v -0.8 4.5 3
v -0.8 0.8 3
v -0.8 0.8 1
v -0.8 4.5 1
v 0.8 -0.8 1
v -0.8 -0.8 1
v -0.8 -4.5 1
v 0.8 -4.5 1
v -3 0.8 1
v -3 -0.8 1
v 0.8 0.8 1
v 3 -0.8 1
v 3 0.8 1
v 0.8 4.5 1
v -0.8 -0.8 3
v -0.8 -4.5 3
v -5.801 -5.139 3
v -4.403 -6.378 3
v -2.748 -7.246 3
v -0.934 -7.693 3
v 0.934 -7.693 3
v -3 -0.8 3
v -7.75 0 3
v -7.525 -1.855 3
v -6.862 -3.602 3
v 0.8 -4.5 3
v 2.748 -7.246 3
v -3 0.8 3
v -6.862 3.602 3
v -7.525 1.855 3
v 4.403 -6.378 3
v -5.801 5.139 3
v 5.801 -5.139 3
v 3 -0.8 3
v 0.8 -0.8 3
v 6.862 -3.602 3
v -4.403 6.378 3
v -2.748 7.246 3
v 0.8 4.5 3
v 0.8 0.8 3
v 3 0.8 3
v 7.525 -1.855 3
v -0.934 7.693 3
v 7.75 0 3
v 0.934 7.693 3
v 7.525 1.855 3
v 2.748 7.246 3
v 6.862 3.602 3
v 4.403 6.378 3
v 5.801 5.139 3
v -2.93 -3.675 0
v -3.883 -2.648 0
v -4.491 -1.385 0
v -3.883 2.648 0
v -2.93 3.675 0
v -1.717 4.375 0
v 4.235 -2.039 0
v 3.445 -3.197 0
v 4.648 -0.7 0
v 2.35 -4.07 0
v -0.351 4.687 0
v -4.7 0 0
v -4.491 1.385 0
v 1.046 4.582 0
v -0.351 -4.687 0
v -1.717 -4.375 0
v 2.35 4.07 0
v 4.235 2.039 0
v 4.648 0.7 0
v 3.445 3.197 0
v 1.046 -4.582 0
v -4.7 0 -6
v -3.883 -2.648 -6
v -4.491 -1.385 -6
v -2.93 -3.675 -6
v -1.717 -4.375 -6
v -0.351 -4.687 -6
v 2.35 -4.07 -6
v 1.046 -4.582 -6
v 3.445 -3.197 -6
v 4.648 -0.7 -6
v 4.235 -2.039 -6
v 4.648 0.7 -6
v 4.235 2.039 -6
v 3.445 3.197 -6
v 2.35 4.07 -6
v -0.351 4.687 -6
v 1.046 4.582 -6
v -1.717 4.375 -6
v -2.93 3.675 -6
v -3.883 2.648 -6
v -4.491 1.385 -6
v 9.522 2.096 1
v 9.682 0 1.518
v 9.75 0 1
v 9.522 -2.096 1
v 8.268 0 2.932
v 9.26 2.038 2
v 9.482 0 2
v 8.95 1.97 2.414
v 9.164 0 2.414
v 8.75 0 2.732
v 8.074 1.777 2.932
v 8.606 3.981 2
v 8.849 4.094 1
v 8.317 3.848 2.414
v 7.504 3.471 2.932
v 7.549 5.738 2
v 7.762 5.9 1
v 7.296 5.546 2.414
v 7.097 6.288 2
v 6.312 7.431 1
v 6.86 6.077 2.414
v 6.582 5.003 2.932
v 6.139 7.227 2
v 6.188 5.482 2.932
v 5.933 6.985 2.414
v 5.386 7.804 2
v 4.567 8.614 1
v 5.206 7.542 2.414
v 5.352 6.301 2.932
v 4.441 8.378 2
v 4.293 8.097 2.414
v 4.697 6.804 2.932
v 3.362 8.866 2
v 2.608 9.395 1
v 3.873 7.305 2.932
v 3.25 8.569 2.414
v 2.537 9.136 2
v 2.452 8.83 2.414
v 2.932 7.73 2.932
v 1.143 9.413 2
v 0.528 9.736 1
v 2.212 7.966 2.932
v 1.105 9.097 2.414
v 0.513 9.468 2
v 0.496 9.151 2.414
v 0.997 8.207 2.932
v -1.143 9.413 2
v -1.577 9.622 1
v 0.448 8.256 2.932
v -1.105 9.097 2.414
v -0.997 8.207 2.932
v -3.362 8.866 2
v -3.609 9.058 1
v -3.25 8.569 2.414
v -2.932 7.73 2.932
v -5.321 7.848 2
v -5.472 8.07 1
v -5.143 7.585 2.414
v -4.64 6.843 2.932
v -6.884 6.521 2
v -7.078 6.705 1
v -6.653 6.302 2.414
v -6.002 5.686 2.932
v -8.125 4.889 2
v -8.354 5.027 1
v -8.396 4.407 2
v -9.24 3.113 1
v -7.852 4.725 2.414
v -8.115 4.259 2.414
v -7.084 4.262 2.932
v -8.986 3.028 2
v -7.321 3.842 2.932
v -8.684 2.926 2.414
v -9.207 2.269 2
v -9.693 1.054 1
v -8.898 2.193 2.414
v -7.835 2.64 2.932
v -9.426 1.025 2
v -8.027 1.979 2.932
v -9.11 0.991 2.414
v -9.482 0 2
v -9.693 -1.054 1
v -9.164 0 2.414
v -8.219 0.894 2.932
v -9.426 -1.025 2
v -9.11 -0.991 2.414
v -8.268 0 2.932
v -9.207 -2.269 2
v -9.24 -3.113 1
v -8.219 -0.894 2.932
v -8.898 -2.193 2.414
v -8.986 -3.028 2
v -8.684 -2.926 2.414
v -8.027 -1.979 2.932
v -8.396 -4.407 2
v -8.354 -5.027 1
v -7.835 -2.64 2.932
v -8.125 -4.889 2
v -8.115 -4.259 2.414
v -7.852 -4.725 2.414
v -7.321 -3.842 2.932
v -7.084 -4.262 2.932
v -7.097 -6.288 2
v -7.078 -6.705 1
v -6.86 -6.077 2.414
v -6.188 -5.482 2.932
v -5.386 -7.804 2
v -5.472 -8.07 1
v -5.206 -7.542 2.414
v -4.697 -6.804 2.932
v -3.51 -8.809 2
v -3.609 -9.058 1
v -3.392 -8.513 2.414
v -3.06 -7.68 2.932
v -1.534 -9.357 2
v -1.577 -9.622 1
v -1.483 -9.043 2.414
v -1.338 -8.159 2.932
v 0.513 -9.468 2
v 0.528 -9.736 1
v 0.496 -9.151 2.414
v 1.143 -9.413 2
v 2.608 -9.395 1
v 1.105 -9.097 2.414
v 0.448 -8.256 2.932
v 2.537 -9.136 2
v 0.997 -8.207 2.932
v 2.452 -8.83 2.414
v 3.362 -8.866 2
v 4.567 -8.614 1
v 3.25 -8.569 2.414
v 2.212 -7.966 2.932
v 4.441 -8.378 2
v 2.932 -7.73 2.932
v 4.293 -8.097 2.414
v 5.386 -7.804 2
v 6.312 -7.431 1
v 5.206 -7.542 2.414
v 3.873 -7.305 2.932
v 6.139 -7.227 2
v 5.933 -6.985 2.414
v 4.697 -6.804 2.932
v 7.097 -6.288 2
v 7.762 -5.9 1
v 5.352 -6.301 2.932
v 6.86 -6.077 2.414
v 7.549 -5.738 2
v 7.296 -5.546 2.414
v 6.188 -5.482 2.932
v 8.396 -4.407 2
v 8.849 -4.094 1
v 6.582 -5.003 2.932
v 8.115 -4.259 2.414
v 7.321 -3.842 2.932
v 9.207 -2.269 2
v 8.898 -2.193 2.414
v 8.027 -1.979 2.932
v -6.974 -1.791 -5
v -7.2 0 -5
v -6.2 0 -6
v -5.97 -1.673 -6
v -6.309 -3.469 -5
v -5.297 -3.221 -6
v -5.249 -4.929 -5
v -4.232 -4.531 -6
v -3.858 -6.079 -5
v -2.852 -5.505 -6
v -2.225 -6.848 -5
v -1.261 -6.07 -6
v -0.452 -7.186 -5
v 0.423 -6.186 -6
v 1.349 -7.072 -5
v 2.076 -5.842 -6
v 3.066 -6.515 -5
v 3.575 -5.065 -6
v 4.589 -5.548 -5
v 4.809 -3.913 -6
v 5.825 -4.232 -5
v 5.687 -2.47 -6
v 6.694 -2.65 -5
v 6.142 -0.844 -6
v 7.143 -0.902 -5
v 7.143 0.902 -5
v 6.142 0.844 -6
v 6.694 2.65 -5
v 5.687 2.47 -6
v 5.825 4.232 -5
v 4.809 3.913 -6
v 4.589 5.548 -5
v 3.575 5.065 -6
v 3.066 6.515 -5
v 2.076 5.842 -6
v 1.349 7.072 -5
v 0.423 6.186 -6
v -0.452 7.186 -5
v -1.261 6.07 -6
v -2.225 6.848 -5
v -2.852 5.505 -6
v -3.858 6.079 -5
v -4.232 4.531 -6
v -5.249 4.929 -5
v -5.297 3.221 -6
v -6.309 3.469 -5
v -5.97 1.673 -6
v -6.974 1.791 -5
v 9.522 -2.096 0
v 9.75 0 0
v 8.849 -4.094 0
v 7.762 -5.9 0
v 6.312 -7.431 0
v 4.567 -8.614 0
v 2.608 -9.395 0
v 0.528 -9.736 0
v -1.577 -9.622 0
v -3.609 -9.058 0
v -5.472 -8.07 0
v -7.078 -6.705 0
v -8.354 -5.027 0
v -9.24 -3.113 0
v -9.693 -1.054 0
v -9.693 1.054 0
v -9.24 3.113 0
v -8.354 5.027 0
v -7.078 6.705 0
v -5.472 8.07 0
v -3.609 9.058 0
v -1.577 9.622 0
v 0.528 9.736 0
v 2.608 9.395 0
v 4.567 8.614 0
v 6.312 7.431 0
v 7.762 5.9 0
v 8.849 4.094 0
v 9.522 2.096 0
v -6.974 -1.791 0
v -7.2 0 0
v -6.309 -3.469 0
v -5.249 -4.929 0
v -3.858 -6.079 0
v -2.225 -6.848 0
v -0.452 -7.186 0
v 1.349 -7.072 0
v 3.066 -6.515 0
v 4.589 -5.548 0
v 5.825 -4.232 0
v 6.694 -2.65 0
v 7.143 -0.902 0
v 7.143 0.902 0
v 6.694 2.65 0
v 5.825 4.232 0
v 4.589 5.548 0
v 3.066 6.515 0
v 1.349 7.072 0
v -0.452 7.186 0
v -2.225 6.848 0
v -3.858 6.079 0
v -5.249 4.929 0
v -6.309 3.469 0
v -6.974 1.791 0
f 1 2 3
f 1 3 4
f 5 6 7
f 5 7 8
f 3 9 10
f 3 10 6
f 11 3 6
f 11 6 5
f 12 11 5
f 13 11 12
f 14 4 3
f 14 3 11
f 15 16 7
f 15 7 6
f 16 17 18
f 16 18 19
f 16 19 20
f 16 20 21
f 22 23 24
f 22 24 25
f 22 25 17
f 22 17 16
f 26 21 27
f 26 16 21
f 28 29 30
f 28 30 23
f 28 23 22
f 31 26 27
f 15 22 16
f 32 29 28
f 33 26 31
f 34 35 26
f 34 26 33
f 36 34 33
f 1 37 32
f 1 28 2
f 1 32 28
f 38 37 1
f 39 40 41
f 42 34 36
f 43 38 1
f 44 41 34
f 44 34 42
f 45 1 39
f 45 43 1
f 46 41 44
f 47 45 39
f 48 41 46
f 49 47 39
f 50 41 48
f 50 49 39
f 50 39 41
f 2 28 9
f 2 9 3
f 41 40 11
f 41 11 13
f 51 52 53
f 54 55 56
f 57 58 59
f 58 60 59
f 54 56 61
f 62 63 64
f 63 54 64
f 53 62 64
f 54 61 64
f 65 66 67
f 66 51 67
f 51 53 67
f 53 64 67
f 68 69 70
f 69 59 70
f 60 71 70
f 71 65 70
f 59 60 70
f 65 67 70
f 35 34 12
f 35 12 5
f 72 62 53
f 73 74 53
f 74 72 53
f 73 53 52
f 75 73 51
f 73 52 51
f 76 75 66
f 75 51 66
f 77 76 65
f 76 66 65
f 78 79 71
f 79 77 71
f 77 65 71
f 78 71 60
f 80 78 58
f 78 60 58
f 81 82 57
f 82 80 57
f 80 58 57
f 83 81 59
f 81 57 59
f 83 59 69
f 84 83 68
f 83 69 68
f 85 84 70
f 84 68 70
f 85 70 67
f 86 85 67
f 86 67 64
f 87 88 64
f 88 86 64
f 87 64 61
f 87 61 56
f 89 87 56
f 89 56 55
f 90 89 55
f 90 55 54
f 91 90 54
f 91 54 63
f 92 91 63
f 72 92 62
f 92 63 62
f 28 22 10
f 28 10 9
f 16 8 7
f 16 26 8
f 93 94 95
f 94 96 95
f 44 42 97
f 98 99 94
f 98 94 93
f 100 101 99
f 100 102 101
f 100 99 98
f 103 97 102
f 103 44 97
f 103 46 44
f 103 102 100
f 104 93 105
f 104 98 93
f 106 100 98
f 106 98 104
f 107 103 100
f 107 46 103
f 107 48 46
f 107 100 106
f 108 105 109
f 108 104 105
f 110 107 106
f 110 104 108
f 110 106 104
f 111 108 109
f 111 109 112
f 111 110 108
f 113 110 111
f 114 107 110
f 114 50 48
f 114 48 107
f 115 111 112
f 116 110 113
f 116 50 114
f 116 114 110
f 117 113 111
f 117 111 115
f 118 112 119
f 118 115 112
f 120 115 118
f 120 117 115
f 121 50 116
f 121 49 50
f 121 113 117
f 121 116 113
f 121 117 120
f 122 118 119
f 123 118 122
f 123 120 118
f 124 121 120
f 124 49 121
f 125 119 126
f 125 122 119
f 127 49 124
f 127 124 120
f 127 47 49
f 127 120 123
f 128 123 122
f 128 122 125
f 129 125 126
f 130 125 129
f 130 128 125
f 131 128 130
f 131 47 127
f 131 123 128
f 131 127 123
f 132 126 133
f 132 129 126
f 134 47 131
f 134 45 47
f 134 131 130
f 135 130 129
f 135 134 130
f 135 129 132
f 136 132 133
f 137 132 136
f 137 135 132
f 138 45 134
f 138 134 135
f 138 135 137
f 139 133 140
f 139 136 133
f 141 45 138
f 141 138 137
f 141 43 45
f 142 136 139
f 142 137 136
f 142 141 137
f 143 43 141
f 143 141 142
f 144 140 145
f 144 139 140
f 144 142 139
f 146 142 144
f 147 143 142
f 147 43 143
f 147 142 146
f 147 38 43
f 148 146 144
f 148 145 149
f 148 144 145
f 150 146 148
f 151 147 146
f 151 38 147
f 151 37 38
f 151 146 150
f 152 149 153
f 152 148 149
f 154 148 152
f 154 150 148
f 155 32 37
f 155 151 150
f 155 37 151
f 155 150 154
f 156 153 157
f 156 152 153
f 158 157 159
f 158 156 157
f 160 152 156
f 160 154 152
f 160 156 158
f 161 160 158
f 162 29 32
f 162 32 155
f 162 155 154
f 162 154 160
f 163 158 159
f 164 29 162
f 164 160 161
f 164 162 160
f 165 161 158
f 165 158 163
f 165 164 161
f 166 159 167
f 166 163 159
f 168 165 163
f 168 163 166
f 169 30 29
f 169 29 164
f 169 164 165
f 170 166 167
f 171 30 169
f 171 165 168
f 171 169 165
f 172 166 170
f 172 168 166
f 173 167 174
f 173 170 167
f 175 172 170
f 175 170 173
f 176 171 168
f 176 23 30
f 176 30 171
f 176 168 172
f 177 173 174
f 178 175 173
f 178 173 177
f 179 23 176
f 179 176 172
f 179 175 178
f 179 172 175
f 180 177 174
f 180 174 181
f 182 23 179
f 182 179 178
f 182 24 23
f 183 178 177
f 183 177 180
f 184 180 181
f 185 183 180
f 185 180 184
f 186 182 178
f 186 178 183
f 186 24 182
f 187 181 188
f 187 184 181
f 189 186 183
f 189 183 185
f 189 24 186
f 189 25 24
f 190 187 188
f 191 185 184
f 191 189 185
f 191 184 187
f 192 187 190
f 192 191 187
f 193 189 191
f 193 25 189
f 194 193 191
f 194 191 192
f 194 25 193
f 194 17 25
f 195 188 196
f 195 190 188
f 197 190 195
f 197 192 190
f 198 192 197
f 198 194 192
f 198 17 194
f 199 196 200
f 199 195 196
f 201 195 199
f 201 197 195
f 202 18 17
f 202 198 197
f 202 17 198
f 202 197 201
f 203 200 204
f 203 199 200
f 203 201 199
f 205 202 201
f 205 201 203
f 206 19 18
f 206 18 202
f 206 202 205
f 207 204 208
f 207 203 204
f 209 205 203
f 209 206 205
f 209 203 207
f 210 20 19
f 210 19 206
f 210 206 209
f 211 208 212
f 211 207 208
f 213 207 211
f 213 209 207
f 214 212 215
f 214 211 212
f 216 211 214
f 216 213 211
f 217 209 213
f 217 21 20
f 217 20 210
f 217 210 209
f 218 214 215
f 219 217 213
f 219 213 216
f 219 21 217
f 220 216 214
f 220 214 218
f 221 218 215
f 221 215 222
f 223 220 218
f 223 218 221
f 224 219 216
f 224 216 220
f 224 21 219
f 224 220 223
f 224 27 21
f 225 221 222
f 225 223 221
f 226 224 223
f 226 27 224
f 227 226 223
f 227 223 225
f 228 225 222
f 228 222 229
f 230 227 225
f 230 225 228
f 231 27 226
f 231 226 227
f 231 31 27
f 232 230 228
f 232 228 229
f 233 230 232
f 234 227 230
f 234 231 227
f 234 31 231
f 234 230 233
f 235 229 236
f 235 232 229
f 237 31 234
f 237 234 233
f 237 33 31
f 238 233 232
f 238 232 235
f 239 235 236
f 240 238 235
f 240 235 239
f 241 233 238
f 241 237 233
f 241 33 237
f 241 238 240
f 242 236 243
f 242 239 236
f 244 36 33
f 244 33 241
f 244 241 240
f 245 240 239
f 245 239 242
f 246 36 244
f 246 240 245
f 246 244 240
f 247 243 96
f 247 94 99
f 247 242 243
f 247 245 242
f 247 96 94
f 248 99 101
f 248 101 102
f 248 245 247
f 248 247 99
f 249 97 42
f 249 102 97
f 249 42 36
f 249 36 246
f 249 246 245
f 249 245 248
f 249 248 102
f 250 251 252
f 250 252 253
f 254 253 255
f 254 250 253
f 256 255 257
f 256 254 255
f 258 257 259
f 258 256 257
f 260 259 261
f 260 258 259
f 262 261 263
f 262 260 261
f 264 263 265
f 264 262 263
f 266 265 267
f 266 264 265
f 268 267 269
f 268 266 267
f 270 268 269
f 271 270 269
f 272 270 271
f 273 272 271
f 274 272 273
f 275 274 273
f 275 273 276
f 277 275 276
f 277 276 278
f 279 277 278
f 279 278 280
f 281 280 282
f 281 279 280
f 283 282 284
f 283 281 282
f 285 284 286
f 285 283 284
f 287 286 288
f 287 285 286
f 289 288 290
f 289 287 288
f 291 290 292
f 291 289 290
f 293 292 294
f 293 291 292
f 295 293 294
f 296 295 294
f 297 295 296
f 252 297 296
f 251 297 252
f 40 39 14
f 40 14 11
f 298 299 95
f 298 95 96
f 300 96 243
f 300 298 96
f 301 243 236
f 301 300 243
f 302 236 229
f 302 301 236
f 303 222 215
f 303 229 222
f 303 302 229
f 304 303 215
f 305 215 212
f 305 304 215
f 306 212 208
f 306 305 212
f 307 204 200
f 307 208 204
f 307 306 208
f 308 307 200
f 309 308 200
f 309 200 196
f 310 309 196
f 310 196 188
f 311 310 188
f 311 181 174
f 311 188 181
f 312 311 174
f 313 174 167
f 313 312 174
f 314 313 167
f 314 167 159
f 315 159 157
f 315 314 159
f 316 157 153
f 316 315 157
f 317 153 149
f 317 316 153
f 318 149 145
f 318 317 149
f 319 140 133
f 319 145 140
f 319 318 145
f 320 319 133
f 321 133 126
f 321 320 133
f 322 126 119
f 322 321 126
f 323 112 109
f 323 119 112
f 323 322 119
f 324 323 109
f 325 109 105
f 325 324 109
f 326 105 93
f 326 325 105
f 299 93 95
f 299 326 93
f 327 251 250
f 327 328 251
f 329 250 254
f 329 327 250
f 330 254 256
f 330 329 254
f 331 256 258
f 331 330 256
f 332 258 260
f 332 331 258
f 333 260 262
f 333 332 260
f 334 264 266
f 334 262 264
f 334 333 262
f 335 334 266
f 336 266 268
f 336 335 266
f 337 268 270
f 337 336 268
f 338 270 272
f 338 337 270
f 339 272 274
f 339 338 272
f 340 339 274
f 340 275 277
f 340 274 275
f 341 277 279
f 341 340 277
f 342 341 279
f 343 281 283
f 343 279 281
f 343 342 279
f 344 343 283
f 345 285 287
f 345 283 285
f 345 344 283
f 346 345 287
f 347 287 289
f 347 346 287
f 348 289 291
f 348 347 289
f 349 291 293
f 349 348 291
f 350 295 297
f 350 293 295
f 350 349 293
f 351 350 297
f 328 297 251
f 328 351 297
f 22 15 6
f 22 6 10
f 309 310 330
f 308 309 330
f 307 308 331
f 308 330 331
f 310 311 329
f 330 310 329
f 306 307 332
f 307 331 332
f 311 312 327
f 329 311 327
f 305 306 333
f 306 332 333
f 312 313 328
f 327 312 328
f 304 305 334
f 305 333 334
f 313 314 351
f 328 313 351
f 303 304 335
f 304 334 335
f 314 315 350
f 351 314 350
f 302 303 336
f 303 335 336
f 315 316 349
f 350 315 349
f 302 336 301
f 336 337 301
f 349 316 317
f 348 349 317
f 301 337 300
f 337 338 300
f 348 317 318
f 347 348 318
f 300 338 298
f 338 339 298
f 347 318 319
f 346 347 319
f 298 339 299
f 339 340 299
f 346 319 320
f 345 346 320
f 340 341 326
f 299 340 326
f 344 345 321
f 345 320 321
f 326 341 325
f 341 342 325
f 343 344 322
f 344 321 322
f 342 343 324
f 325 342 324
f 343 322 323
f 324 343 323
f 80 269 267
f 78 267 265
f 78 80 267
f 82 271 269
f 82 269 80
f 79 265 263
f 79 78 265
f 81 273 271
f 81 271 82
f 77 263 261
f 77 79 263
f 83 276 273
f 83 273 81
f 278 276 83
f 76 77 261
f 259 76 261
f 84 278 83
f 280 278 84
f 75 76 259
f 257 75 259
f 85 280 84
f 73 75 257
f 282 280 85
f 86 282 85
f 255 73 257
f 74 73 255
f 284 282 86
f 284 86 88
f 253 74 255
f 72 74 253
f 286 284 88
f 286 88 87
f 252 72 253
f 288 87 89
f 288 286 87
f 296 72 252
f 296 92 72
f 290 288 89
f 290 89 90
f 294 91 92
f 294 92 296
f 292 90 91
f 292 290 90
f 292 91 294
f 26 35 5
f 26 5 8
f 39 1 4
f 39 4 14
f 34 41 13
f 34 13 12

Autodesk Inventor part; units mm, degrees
ref_plane "YZ Plane" through (0, 0, 0) normal (1, 0, 0) x (0, 1, 0)
ref_plane "XZ Plane" through (0, 0, 0) normal (0, 1, 0) x (-1, 0, 0)
ref_plane "XY Plane" through (0, 0, 0) normal (0, 0, 1) x (1, 0, 0)
sketch "Sketch1" plane through (0, 0, 0) normal (0, 0, 1) x (1, 0, 0)
  circle A0 centre (0, 0) radius 9.75
  dimension "d0" = 19.5
extrude "Extrusion1" add sketch "Sketch1" along normal blind 3
sketch "Sketch2" plane through (0, 0, 0) normal (0, 0, -1) x (-1, 0, 0)
  circle A0 centre (0, 0) radius 7.2
  circle A1 centre (0, 0) radius 4.7
  dimension "d3" = 14.4
  dimension "d4" = 2.5
extrude "Extrusion2" add sketch "Sketch2" along normal blind 6
fillet "Fillet1" radius 2 1 edges at (-9.75, 0, 3)
sketch "Sketch3" plane through (0, 0, 3) normal (0, 0, 1) x (1, 0, 0)
  line L0 (0.8, -4.5) -> (-0.8, -4.5)
  line L1 (-0.8, 4.5) -> (0.8, 4.5)
  line L2 (0.8, -4.5) -> (-0.8, 4.5) construction
  line L3 (-0.8, -4.5) -> (0.8, 4.5) construction
  line L4 (-3, -0.8) -> (-3, 0.8)
  line L5 (3, 0.8) -> (3, -0.8)
  circle A0 centre (0, 0) radius 4.7 projected
  line L6 (3, -0.8) -> (-3, 0.8) construction
  line L7 (-3, -0.8) -> (3, 0.8) construction
  line L8 (3, -0.8) -> (0.8, -0.8)
  line L9 (-0.8, -4.5) -> (-0.8, -0.8)
  line L10 (0.1422, -0.8) -> (-0.1422, -0.8)
  line L11 (-0.8, -0.8) -> (-3, -0.8)
  line L12 (0.8, 0.8) -> (3, 0.8)
  line L13 (-3, 0.8) -> (-0.8, 0.8)
  line L14 (-0.1422, 0.8) -> (0.1422, 0.8)
  line L15 (-0.8, -0.2133) -> (-0.8, 0.2133)
  line L16 (-0.8, 0.8) -> (-0.8, 4.5)
  line L17 (0.8, 4.5) -> (0.8, 0.8)
  line L18 (0.8, 0.2133) -> (0.8, -0.2133)
  line L19 (0.8, -0.8) -> (0.8, -4.5)
  dimension "d8" = 9
  dimension "d9" = 6
extrude "Extrusion3" cut sketch "Sketch3" against normal blind 2 contours L0 L9 L11 L4 L13 L16 L1 L17 L12 L5 L8 L19
thread "Thread1" size "M15x1.5" class "6g" standard "ANSI Metric M Profile" full length
chamfer "Chamfer1" distance 1 angle 45 1 edges at (7.2, 0, -6)
equation "\"d11\" = d10"
equation "\"d10\" = 1.6"
properties part number "PG9x6mm_Plug"
